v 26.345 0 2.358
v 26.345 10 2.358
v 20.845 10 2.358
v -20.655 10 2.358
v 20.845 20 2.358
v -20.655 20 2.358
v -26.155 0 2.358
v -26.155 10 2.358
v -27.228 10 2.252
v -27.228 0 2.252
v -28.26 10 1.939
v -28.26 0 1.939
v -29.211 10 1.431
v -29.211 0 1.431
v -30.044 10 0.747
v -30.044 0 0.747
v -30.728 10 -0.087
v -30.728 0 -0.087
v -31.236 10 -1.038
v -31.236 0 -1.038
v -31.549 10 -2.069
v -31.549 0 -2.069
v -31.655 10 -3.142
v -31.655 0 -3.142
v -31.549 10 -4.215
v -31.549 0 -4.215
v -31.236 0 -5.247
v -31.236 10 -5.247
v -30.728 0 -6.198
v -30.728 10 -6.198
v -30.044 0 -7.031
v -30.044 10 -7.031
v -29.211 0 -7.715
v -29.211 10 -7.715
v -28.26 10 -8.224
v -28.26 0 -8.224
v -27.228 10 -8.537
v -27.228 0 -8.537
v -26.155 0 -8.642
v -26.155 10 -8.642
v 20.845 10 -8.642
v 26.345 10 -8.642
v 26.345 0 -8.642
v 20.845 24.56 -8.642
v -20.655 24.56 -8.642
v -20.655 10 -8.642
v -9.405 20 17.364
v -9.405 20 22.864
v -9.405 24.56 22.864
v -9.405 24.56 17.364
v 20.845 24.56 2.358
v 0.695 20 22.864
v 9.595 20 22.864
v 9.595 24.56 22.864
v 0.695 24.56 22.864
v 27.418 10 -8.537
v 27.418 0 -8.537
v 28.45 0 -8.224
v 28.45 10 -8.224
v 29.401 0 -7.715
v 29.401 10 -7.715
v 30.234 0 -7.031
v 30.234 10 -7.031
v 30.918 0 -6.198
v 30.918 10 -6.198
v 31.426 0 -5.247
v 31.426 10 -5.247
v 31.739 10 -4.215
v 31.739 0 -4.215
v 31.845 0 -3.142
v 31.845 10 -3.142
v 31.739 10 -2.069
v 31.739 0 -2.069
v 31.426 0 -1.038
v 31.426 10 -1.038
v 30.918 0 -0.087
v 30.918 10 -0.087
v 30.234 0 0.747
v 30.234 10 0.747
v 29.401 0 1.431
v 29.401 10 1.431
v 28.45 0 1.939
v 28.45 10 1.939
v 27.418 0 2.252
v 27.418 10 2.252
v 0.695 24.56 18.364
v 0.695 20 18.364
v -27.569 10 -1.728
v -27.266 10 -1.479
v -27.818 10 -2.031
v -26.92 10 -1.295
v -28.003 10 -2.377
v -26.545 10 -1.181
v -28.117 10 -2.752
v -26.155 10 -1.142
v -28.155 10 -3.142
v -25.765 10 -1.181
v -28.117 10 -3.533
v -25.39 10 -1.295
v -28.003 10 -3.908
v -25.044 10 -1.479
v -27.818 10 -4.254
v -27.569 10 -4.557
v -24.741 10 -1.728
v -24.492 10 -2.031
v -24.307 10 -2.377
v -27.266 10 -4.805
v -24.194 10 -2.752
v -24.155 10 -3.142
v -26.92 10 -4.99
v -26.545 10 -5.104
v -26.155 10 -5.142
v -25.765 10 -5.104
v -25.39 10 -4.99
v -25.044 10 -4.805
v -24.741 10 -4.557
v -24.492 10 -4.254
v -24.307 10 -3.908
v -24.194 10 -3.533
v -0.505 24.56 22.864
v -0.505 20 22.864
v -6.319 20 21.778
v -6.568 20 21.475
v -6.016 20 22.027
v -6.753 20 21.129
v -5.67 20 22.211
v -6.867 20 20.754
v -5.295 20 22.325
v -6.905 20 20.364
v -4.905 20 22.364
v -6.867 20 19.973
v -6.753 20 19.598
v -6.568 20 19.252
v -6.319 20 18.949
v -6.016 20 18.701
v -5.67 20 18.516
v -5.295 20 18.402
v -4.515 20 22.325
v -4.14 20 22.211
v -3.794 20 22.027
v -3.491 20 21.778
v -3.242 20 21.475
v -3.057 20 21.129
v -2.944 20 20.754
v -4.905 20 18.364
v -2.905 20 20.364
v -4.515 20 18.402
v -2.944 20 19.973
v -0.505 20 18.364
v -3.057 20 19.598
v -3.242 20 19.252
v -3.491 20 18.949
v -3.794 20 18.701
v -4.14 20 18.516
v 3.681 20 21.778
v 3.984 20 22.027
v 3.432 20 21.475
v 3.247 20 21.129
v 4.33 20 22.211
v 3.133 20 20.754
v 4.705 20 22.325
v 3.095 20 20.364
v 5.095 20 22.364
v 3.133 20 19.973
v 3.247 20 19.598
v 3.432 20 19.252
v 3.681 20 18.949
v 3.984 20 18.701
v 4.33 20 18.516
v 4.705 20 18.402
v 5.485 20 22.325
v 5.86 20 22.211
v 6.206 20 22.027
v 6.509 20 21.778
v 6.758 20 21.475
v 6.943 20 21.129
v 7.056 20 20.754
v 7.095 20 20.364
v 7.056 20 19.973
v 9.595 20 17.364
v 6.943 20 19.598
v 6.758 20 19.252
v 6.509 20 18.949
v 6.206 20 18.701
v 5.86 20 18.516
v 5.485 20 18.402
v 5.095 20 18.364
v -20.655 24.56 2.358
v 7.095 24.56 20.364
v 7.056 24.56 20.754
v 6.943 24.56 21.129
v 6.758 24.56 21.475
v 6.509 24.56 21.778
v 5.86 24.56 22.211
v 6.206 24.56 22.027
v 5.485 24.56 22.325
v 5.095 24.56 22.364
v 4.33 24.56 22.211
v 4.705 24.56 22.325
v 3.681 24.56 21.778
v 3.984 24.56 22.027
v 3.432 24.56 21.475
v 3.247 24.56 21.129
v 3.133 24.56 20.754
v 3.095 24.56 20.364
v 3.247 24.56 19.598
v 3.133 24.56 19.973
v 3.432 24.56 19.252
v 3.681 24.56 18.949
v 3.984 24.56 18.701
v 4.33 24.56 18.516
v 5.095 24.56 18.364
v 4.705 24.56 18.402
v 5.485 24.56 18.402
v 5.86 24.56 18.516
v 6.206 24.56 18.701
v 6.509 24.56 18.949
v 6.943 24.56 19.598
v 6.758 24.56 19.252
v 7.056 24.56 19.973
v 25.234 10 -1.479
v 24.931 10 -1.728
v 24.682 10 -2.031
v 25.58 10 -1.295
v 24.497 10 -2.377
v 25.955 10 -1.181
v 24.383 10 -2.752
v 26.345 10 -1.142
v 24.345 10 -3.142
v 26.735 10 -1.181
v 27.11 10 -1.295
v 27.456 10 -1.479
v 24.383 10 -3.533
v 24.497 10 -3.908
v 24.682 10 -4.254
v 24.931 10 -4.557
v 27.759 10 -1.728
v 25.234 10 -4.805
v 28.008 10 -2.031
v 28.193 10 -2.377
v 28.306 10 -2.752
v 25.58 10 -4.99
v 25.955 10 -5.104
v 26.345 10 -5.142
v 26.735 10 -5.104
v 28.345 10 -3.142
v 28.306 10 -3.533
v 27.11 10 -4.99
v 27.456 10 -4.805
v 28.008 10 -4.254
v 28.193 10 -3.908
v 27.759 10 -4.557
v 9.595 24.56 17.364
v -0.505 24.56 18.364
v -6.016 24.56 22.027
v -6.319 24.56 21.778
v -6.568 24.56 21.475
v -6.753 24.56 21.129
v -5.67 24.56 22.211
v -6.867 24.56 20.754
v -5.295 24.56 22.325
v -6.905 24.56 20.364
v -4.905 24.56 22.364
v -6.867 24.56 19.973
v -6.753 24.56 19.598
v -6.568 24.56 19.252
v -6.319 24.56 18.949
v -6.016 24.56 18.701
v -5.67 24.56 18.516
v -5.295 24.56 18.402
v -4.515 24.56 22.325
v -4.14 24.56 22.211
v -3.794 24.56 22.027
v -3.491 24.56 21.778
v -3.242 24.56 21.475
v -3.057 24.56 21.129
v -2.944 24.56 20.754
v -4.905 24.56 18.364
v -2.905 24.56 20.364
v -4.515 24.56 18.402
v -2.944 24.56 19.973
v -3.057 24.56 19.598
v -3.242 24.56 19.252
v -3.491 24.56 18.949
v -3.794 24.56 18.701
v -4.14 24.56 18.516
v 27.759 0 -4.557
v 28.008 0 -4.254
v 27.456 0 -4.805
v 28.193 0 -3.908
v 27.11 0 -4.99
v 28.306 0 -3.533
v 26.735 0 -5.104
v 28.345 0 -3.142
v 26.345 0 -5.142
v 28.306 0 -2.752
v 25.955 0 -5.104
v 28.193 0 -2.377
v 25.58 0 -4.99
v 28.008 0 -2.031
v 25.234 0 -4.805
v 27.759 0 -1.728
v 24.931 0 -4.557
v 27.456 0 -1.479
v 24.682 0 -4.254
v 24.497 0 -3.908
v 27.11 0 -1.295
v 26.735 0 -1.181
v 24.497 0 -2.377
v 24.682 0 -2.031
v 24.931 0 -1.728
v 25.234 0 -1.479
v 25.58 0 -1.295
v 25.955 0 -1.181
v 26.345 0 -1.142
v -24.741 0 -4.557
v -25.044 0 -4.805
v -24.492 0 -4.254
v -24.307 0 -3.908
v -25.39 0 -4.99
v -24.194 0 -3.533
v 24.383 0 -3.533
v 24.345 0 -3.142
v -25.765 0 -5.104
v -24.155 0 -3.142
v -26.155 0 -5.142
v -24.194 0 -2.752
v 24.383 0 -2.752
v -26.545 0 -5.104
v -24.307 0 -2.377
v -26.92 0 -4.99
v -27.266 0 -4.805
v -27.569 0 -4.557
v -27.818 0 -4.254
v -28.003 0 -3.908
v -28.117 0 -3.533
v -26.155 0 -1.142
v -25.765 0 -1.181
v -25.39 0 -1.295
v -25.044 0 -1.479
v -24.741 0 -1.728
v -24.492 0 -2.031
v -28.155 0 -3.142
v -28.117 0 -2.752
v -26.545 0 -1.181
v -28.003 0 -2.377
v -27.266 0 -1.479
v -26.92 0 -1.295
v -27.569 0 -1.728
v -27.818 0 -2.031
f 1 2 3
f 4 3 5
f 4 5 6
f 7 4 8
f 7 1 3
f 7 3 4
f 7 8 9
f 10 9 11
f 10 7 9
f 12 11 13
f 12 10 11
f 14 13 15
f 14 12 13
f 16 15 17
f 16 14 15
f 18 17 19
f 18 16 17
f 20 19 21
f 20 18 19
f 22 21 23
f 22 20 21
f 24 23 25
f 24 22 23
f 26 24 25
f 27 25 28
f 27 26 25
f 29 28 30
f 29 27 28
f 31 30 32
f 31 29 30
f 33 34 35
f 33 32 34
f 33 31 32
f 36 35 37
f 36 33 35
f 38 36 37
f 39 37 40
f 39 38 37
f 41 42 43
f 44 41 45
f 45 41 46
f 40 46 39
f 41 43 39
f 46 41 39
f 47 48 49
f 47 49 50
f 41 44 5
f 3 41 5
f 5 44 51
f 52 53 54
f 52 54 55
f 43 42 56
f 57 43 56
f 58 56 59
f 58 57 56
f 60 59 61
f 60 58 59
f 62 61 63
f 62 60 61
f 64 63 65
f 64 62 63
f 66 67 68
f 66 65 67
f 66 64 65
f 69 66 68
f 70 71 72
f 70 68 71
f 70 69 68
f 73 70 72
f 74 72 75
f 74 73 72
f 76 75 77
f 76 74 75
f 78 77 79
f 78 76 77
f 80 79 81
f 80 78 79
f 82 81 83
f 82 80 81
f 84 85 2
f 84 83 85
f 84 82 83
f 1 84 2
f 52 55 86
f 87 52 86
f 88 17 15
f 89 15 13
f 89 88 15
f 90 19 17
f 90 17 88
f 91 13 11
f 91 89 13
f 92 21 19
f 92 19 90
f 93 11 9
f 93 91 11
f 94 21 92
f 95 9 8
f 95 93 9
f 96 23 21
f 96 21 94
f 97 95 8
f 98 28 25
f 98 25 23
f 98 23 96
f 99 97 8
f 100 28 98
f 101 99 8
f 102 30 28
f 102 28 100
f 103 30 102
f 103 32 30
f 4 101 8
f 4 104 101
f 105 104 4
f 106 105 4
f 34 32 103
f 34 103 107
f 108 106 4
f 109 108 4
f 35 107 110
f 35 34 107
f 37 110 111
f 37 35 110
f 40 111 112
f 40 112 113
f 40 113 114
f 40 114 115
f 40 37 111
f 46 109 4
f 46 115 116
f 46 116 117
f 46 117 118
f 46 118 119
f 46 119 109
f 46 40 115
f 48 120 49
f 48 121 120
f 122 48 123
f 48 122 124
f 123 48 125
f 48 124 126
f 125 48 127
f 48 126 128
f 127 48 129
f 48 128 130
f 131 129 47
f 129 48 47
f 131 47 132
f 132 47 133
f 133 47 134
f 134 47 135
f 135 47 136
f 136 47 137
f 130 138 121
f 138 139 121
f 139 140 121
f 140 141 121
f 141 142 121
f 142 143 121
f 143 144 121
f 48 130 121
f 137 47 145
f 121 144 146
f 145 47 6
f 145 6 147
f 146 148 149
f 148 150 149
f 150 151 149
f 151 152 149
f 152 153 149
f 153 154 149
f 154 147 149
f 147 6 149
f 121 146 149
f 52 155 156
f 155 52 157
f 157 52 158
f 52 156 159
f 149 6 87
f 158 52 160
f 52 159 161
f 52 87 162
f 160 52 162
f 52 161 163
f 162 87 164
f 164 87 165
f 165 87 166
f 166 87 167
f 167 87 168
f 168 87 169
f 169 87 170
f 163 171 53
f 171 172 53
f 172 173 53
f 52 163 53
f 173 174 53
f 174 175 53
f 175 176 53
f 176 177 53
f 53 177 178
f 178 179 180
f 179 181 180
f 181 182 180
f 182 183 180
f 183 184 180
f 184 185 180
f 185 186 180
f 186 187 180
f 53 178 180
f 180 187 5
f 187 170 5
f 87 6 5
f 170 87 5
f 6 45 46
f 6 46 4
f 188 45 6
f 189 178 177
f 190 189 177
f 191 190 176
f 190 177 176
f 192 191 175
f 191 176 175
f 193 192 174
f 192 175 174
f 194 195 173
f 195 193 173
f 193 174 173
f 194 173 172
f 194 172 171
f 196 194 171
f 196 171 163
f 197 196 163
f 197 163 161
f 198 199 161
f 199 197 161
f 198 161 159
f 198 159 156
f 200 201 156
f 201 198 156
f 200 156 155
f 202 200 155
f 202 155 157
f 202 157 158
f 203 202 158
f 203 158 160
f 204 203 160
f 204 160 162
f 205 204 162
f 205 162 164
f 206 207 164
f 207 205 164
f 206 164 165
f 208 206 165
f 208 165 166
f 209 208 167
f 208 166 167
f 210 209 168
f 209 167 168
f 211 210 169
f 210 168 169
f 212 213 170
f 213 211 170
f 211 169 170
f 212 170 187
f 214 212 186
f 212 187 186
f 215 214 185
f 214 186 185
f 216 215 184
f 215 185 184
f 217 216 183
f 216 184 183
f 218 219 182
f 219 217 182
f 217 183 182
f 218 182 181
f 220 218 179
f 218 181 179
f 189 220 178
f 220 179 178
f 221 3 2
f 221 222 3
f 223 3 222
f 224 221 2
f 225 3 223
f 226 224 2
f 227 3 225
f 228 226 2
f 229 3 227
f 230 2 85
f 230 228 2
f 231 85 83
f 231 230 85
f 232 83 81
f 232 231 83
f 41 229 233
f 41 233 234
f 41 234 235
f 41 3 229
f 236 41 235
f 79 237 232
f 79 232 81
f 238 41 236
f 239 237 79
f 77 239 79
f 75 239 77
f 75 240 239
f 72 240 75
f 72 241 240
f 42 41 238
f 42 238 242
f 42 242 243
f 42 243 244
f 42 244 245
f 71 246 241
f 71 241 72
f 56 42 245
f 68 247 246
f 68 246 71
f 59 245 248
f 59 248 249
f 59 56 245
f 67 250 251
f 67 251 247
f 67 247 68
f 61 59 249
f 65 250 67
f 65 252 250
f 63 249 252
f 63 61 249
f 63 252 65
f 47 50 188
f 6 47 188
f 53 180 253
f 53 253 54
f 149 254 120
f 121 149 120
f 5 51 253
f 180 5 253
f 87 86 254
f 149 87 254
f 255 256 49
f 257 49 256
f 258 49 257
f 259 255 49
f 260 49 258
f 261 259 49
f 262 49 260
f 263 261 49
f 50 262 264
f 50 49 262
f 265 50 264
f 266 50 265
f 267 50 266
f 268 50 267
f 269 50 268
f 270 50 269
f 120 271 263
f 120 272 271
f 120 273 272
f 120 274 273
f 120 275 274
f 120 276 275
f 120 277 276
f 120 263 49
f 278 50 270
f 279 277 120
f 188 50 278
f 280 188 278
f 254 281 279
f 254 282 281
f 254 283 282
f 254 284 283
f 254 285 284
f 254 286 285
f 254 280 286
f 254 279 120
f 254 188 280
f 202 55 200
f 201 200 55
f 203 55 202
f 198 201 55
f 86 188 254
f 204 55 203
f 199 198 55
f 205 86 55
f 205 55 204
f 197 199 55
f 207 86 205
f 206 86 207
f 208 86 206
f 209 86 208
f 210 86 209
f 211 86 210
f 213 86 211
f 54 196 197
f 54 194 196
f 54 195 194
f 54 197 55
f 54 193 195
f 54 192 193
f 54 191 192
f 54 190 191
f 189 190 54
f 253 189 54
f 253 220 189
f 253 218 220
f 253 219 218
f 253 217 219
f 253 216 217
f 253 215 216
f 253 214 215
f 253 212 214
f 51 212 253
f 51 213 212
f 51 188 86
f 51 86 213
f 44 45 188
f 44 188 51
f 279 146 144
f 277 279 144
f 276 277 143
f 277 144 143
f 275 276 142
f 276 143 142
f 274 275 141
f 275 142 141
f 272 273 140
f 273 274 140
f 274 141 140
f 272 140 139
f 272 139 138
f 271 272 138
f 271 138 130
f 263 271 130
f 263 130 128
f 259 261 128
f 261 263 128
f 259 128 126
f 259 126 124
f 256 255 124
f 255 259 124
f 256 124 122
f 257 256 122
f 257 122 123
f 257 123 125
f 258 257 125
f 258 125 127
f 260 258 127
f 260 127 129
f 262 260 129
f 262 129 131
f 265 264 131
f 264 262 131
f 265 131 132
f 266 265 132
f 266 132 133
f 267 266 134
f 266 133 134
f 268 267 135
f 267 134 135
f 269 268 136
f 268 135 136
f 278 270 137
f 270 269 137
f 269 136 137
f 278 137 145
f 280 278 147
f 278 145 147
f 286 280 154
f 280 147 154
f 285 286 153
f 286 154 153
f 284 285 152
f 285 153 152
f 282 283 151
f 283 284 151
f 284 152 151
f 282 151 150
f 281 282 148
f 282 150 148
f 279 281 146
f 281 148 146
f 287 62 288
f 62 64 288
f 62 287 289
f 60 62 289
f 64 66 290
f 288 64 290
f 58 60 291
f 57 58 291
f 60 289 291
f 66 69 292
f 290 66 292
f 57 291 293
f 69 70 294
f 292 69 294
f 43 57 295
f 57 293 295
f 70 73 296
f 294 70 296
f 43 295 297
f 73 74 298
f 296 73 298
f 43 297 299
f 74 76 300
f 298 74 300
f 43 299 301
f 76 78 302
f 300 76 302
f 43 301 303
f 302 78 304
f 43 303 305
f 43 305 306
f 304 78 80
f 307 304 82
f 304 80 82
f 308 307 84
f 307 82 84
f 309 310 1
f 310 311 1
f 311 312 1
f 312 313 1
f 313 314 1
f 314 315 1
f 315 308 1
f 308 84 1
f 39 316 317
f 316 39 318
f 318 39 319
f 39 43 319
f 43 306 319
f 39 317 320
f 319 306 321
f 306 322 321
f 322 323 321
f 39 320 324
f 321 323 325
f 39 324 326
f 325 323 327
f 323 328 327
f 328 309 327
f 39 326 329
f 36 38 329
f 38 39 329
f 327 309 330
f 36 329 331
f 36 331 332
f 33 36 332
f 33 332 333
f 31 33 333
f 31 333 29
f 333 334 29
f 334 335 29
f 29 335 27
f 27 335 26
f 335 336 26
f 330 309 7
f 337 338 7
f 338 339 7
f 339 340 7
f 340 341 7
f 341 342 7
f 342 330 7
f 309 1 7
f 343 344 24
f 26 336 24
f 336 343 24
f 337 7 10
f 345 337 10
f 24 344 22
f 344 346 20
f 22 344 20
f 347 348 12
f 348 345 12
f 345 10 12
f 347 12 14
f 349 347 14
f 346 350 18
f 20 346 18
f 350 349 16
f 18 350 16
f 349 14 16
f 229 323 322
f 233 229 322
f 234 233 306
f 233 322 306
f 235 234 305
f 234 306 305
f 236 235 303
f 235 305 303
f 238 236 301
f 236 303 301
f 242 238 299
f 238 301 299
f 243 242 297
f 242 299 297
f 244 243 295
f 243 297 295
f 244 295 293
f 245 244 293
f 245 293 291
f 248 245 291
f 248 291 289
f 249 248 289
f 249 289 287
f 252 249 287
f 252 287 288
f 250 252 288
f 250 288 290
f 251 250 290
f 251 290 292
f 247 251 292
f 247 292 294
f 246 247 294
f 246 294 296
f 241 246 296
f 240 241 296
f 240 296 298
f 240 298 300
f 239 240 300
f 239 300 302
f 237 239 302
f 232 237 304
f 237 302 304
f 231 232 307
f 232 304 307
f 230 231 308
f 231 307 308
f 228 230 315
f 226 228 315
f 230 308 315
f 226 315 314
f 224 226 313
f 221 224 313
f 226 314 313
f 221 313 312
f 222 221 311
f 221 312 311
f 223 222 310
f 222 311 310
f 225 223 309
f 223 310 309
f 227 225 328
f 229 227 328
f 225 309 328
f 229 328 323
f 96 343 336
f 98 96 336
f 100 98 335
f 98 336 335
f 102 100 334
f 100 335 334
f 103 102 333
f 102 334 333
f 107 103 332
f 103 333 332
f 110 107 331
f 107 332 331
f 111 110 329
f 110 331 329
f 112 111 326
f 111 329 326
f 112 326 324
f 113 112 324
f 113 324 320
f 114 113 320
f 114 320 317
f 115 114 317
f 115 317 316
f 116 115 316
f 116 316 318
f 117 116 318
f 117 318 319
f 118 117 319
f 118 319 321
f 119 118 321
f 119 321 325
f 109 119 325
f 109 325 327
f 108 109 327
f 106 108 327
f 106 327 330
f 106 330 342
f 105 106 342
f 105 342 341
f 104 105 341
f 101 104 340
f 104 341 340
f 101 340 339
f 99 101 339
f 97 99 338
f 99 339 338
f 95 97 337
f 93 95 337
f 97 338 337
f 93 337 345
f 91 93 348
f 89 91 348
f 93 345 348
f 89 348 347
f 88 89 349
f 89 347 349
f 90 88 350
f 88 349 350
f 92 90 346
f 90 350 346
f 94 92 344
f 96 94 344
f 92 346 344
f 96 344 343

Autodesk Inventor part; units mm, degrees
ref_plane "YZ Plane" through (0, 0, 0) normal (1, 0, 0) x (0, 1, 0)
ref_plane "XZ Plane" through (0, 0, 0) normal (0, 1, 0) x (-1, 0, 0)
ref_plane "XY Plane" through (0, 0, 0) normal (0, 0, 1) x (1, 0, 0)
sketch "Sketch1" plane through (0, 0, 0) normal (0, 1, 0) x (-1, 0, 0)
  circle A0 centre (-26.3449, -3.1424) radius 2
  arc A1 (-35.0949, -0.1424) -> (-17.5949, -0.1424) centre (-26.3449, -0.1424) ccw
  arc A2 (17.4051, -0.1424) -> (34.9051, -0.1424) centre (26.1551, -0.1424) ccw
  circle A3 centre (26.1551, -3.1424) radius 2
  circle A4 centre (-26.3449, -3.1424) radius 2
  circle A5 centre (26.1551, -3.1424) radius 2
  circle A6 centre (26.1551, -0.1424) radius 8.75
  circle A7 centre (-26.3449, -0.1424) radius 8.75
  line L0 (-35.0949, -0.1424) -> (-17.5949, -0.1424)
  line L1 (17.4051, -0.1424) -> (34.9051, -0.1424)
  circle A8 centre (-26.3449, -3.1424) radius 5.5
  circle A9 centre (26.1551, -3.1424) radius 5.5
  line L2 (-26.3449, -8.6424) -> (26.1551, -8.6424)
  line L3 (-26.3449, 2.3576) -> (26.1551, 2.3576)
  point P0 (0, 0)
  point P1 (-0.1898, -0.0949)
  dimension "d0" = 11
  dimension "d1" = 11
extrude "Extrusion1" add sketch "Sketch1" along normal blind 20 contours L2 A8 L0 A1 | A1 A7 L3 A6 A2 L2 | A7 L0 A8 L3 | A8 L0 | L0 A8 | A2 L1 A9 L2 | L3 A9 L1 A6 | A9 L1 | A9 L1 picked at (-18.8837, -1.0963) picked at (-20.7697, 1.0381) picked at (18.6638, -1.1758) picked at (20.5799, 1.0381)
sketch "Sketch2" plane through (0, 20, 0) normal (0, 1, 0) x (1, 0, 0)
  circle A0 centre (-26.1551, 3.1424) radius 2 projected
  circle A1 centre (26.3449, 3.1424) radius 2 projected
  circle A2 centre (-26.1551, 3.1424) radius 5.5
  circle A3 centre (26.3449, 3.1424) radius 5.5
  line L0 (26.3449, 8.6424) -> (-26.1551, 8.6424) projected
  line L1 (-20.6551, 8.6424) -> (-20.6551, -2.3576)
  line L2 (-26.1551, -2.3576) -> (26.3449, -2.3576) projected
  line L3 (20.8449, 8.6424) -> (20.8449, -2.3576)
  line L4 (-26.1551, 8.6424) -> (-20.6551, 8.6424)
  line L5 (-26.1551, -2.3576) -> (-20.6551, -2.3576)
  line L6 (20.8449, 8.6424) -> (26.3449, 8.6424)
  line L7 (20.8449, -2.3576) -> (26.3449, -2.3576)
  point P0 (0, 0)
extrude "Extrusion2" cut sketch "Sketch2" against normal blind 10 contours A2 | L1 L2 A2 | A2 L0 L1 | L0 A3 L3 | L3 A3 L2 | A3
sketch "Sketch4" plane through (0, 20, 0) normal (0, 1, 0) x (1, 0, 0)
  line L0 (20.8449, 8.6424) -> (-20.6551, 8.6424) projected
  line L1 (-20.6551, -2.3576) -> (20.8449, -2.3576) projected
  line L2 (-20.6551, 8.6424) -> (20.8449, 8.6424)
  line L3 (20.8449, 8.6424) -> (20.8449, -2.3576)
  line L4 (20.8449, -2.3576) -> (-20.6551, -2.3576)
  line L5 (-20.6551, -2.3576) -> (-20.6551, 8.6424)
  line L6 (-20.6551, -2.3576) -> (20.8449, -2.3576)
  line L7 (20.8449, -2.3576) -> (20.8449, -17.3636)
  line L8 (20.8449, -17.3636) -> (-20.6551, -17.3636)
  line L9 (-20.6551, -17.3636) -> (-20.6551, -2.3576)
  line L10 (9.5949, -22.8636) -> (-9.4051, -22.8636)
  line L11 (-9.4051, -22.8636) -> (-9.4051, -11.8636)
  line L12 (-9.4051, -11.8636) -> (9.5949, -11.8636)
  line L13 (9.5949, -11.8636) -> (9.5949, -22.8636)
  line L14 (9.5949, -22.8636) -> (-9.4051, -11.8636) construction
  line L15 (-9.4051, -22.8636) -> (9.5949, -11.8636) construction
  circle A0 centre (-4.9051, -20.3636) radius 2
  circle A1 centre (5.0949, -20.3636) radius 2
  point P0 (0, 0)
  point P1 (-9.4051, -17.3636)
  point P2 (9.5949, -17.3636)
  dimension "d27" = 19
  dimension "d28" = 11
  dimension "d29" = 4
  dimension "d30" = 3
  dimension "d31" = 4.5
  dimension "d32" = 4
  dimension "d33" = 3
  dimension "d34" = 4.5
  dimension "d37" = 20.506
extrude "Extrusion5" add sketch "Sketch4" along normal blind 4.56
sketch "Sketch5" plane through (0, 24.56, 0) normal (0, 1, 0) x (1, 0, 0)
  line L0 (-9.4051, -22.8636) -> (9.5949, -22.8636) projected
  line L1 (9.5949, -17.3636) -> (20.8449, -17.3636) projected
  line L2 (-9.4051, -22.8636) -> (9.5949, -22.8636)
  line L3 (9.5949, -22.8636) -> (9.5949, -17.3636)
  line L4 (9.5949, -17.3636) -> (-9.4051, -17.3636)
  line L5 (-9.4051, -17.3636) -> (-9.4051, -22.8636)
  line L6 (-0.5051, -27.3636) -> (0.6949, -27.3636)
  line L7 (0.6949, -27.3636) -> (0.6949, -18.3636)
  line L8 (0.6949, -18.3636) -> (-0.5051, -18.3636)
  line L9 (-0.5051, -18.3636) -> (-0.5051, -27.3636)
  line L10 (-0.5051, -27.3636) -> (0.6949, -18.3636) construction
  line L11 (0.6949, -27.3636) -> (-0.5051, -18.3636) construction
  point P0 (0, 0)
  point P1 (0.0949, -22.8636)
  dimension "d41" = 1.2
extrude "Extrusion6" cut sketch "Sketch5" against normal blind 4.56 contours L9 L8 L7 L0 | L0 L7 L6 L9
sketch "Sketch6" plane through (0, 24.56, 0) normal (0, 1, 0) x (1, 0, 0)
  line L0 (26.3449, -2.3576) -> (20.8449, -2.3576) projected
  arc A0 (26.3449, -2.3576) -> (26.3449, 8.6424) centre (26.3449, 3.1424) ccw projected
  line L1 (20.8449, 8.6424) -> (26.3449, 8.6424) projected
  line L2 (20.8449, -2.3576) -> (20.8449, 8.6424) projected
  circle A1 centre (26.3449, 3.1424) radius 2 projected
  line L3 (-20.6551, -2.3576) -> (-26.1551, -2.3576) projected
  line L4 (-20.6551, 8.6424) -> (-20.6551, -2.3576) projected
  line L5 (-26.1551, 8.6424) -> (-20.6551, 8.6424) projected
  arc A2 (-26.1551, 8.6424) -> (-26.1551, -2.3576) centre (-26.1551, 3.1424) ccw projected
  circle A3 centre (-26.1551, 3.1424) radius 2 projected
  circle A4 centre (5.0949, -20.3636) radius 2 projected
  circle A5 centre (-4.9051, -20.3636) radius 2 projected
  line L6 (-0.5051, -22.8636) -> (-0.5051, -18.3636) projected
  line L7 (-0.5051, -18.3636) -> (0.6949, -18.3636) projected
  line L8 (0.6949, -18.3636) -> (0.6949, -22.8636) projected
  line L9 (0.6949, -22.8636) -> (9.5949, -22.8636) projected
  line L10 (9.5949, -22.8636) -> (9.5949, -17.3636) projected
  line L11 (9.5949, -17.3636) -> (20.8449, -17.3636) projected
  line L12 (20.8449, -17.3636) -> (20.8449, 8.6424) projected
  line L13 (20.8449, 8.6424) -> (-20.6551, 8.6424) projected
  line L14 (-20.6551, 8.6424) -> (-20.6551, -17.3636) projected
  line L15 (-20.6551, -17.3636) -> (-9.4051, -17.3636) projected
  line L16 (-9.4051, -17.3636) -> (-9.4051, -22.8636) projected
  line L17 (-9.4051, -22.8636) -> (-0.5051, -22.8636) projected
  line L18 (20.8449, -2.3576) -> (9.5949, -17.3636)
  line L19 (9.5949, -17.3636) -> (-9.4051, -17.3636)
  line L20 (20.8449, -17.3636) -> (20.8449, 8.6424) projected
  line L21 (-9.4051, -17.3636) -> (-20.6551, -2.3576)
  line L22 (-9.4051, -17.3636) -> (-20.6551, -17.3636)
  line L23 (-20.6551, -17.3636) -> (-20.6551, -2.3576)
  line L24 (20.8449, -17.3636) -> (9.5949, -17.3636)
  line L25 (20.8449, -17.3636) -> (20.8449, -2.3576)
  point P0 (0, 0)
extrude "Extrusion7" cut sketch "Sketch6" against normal blind 4.56 contours L12 L11 L18 | L15 L14 L21
properties part number "Servo holder long side"
